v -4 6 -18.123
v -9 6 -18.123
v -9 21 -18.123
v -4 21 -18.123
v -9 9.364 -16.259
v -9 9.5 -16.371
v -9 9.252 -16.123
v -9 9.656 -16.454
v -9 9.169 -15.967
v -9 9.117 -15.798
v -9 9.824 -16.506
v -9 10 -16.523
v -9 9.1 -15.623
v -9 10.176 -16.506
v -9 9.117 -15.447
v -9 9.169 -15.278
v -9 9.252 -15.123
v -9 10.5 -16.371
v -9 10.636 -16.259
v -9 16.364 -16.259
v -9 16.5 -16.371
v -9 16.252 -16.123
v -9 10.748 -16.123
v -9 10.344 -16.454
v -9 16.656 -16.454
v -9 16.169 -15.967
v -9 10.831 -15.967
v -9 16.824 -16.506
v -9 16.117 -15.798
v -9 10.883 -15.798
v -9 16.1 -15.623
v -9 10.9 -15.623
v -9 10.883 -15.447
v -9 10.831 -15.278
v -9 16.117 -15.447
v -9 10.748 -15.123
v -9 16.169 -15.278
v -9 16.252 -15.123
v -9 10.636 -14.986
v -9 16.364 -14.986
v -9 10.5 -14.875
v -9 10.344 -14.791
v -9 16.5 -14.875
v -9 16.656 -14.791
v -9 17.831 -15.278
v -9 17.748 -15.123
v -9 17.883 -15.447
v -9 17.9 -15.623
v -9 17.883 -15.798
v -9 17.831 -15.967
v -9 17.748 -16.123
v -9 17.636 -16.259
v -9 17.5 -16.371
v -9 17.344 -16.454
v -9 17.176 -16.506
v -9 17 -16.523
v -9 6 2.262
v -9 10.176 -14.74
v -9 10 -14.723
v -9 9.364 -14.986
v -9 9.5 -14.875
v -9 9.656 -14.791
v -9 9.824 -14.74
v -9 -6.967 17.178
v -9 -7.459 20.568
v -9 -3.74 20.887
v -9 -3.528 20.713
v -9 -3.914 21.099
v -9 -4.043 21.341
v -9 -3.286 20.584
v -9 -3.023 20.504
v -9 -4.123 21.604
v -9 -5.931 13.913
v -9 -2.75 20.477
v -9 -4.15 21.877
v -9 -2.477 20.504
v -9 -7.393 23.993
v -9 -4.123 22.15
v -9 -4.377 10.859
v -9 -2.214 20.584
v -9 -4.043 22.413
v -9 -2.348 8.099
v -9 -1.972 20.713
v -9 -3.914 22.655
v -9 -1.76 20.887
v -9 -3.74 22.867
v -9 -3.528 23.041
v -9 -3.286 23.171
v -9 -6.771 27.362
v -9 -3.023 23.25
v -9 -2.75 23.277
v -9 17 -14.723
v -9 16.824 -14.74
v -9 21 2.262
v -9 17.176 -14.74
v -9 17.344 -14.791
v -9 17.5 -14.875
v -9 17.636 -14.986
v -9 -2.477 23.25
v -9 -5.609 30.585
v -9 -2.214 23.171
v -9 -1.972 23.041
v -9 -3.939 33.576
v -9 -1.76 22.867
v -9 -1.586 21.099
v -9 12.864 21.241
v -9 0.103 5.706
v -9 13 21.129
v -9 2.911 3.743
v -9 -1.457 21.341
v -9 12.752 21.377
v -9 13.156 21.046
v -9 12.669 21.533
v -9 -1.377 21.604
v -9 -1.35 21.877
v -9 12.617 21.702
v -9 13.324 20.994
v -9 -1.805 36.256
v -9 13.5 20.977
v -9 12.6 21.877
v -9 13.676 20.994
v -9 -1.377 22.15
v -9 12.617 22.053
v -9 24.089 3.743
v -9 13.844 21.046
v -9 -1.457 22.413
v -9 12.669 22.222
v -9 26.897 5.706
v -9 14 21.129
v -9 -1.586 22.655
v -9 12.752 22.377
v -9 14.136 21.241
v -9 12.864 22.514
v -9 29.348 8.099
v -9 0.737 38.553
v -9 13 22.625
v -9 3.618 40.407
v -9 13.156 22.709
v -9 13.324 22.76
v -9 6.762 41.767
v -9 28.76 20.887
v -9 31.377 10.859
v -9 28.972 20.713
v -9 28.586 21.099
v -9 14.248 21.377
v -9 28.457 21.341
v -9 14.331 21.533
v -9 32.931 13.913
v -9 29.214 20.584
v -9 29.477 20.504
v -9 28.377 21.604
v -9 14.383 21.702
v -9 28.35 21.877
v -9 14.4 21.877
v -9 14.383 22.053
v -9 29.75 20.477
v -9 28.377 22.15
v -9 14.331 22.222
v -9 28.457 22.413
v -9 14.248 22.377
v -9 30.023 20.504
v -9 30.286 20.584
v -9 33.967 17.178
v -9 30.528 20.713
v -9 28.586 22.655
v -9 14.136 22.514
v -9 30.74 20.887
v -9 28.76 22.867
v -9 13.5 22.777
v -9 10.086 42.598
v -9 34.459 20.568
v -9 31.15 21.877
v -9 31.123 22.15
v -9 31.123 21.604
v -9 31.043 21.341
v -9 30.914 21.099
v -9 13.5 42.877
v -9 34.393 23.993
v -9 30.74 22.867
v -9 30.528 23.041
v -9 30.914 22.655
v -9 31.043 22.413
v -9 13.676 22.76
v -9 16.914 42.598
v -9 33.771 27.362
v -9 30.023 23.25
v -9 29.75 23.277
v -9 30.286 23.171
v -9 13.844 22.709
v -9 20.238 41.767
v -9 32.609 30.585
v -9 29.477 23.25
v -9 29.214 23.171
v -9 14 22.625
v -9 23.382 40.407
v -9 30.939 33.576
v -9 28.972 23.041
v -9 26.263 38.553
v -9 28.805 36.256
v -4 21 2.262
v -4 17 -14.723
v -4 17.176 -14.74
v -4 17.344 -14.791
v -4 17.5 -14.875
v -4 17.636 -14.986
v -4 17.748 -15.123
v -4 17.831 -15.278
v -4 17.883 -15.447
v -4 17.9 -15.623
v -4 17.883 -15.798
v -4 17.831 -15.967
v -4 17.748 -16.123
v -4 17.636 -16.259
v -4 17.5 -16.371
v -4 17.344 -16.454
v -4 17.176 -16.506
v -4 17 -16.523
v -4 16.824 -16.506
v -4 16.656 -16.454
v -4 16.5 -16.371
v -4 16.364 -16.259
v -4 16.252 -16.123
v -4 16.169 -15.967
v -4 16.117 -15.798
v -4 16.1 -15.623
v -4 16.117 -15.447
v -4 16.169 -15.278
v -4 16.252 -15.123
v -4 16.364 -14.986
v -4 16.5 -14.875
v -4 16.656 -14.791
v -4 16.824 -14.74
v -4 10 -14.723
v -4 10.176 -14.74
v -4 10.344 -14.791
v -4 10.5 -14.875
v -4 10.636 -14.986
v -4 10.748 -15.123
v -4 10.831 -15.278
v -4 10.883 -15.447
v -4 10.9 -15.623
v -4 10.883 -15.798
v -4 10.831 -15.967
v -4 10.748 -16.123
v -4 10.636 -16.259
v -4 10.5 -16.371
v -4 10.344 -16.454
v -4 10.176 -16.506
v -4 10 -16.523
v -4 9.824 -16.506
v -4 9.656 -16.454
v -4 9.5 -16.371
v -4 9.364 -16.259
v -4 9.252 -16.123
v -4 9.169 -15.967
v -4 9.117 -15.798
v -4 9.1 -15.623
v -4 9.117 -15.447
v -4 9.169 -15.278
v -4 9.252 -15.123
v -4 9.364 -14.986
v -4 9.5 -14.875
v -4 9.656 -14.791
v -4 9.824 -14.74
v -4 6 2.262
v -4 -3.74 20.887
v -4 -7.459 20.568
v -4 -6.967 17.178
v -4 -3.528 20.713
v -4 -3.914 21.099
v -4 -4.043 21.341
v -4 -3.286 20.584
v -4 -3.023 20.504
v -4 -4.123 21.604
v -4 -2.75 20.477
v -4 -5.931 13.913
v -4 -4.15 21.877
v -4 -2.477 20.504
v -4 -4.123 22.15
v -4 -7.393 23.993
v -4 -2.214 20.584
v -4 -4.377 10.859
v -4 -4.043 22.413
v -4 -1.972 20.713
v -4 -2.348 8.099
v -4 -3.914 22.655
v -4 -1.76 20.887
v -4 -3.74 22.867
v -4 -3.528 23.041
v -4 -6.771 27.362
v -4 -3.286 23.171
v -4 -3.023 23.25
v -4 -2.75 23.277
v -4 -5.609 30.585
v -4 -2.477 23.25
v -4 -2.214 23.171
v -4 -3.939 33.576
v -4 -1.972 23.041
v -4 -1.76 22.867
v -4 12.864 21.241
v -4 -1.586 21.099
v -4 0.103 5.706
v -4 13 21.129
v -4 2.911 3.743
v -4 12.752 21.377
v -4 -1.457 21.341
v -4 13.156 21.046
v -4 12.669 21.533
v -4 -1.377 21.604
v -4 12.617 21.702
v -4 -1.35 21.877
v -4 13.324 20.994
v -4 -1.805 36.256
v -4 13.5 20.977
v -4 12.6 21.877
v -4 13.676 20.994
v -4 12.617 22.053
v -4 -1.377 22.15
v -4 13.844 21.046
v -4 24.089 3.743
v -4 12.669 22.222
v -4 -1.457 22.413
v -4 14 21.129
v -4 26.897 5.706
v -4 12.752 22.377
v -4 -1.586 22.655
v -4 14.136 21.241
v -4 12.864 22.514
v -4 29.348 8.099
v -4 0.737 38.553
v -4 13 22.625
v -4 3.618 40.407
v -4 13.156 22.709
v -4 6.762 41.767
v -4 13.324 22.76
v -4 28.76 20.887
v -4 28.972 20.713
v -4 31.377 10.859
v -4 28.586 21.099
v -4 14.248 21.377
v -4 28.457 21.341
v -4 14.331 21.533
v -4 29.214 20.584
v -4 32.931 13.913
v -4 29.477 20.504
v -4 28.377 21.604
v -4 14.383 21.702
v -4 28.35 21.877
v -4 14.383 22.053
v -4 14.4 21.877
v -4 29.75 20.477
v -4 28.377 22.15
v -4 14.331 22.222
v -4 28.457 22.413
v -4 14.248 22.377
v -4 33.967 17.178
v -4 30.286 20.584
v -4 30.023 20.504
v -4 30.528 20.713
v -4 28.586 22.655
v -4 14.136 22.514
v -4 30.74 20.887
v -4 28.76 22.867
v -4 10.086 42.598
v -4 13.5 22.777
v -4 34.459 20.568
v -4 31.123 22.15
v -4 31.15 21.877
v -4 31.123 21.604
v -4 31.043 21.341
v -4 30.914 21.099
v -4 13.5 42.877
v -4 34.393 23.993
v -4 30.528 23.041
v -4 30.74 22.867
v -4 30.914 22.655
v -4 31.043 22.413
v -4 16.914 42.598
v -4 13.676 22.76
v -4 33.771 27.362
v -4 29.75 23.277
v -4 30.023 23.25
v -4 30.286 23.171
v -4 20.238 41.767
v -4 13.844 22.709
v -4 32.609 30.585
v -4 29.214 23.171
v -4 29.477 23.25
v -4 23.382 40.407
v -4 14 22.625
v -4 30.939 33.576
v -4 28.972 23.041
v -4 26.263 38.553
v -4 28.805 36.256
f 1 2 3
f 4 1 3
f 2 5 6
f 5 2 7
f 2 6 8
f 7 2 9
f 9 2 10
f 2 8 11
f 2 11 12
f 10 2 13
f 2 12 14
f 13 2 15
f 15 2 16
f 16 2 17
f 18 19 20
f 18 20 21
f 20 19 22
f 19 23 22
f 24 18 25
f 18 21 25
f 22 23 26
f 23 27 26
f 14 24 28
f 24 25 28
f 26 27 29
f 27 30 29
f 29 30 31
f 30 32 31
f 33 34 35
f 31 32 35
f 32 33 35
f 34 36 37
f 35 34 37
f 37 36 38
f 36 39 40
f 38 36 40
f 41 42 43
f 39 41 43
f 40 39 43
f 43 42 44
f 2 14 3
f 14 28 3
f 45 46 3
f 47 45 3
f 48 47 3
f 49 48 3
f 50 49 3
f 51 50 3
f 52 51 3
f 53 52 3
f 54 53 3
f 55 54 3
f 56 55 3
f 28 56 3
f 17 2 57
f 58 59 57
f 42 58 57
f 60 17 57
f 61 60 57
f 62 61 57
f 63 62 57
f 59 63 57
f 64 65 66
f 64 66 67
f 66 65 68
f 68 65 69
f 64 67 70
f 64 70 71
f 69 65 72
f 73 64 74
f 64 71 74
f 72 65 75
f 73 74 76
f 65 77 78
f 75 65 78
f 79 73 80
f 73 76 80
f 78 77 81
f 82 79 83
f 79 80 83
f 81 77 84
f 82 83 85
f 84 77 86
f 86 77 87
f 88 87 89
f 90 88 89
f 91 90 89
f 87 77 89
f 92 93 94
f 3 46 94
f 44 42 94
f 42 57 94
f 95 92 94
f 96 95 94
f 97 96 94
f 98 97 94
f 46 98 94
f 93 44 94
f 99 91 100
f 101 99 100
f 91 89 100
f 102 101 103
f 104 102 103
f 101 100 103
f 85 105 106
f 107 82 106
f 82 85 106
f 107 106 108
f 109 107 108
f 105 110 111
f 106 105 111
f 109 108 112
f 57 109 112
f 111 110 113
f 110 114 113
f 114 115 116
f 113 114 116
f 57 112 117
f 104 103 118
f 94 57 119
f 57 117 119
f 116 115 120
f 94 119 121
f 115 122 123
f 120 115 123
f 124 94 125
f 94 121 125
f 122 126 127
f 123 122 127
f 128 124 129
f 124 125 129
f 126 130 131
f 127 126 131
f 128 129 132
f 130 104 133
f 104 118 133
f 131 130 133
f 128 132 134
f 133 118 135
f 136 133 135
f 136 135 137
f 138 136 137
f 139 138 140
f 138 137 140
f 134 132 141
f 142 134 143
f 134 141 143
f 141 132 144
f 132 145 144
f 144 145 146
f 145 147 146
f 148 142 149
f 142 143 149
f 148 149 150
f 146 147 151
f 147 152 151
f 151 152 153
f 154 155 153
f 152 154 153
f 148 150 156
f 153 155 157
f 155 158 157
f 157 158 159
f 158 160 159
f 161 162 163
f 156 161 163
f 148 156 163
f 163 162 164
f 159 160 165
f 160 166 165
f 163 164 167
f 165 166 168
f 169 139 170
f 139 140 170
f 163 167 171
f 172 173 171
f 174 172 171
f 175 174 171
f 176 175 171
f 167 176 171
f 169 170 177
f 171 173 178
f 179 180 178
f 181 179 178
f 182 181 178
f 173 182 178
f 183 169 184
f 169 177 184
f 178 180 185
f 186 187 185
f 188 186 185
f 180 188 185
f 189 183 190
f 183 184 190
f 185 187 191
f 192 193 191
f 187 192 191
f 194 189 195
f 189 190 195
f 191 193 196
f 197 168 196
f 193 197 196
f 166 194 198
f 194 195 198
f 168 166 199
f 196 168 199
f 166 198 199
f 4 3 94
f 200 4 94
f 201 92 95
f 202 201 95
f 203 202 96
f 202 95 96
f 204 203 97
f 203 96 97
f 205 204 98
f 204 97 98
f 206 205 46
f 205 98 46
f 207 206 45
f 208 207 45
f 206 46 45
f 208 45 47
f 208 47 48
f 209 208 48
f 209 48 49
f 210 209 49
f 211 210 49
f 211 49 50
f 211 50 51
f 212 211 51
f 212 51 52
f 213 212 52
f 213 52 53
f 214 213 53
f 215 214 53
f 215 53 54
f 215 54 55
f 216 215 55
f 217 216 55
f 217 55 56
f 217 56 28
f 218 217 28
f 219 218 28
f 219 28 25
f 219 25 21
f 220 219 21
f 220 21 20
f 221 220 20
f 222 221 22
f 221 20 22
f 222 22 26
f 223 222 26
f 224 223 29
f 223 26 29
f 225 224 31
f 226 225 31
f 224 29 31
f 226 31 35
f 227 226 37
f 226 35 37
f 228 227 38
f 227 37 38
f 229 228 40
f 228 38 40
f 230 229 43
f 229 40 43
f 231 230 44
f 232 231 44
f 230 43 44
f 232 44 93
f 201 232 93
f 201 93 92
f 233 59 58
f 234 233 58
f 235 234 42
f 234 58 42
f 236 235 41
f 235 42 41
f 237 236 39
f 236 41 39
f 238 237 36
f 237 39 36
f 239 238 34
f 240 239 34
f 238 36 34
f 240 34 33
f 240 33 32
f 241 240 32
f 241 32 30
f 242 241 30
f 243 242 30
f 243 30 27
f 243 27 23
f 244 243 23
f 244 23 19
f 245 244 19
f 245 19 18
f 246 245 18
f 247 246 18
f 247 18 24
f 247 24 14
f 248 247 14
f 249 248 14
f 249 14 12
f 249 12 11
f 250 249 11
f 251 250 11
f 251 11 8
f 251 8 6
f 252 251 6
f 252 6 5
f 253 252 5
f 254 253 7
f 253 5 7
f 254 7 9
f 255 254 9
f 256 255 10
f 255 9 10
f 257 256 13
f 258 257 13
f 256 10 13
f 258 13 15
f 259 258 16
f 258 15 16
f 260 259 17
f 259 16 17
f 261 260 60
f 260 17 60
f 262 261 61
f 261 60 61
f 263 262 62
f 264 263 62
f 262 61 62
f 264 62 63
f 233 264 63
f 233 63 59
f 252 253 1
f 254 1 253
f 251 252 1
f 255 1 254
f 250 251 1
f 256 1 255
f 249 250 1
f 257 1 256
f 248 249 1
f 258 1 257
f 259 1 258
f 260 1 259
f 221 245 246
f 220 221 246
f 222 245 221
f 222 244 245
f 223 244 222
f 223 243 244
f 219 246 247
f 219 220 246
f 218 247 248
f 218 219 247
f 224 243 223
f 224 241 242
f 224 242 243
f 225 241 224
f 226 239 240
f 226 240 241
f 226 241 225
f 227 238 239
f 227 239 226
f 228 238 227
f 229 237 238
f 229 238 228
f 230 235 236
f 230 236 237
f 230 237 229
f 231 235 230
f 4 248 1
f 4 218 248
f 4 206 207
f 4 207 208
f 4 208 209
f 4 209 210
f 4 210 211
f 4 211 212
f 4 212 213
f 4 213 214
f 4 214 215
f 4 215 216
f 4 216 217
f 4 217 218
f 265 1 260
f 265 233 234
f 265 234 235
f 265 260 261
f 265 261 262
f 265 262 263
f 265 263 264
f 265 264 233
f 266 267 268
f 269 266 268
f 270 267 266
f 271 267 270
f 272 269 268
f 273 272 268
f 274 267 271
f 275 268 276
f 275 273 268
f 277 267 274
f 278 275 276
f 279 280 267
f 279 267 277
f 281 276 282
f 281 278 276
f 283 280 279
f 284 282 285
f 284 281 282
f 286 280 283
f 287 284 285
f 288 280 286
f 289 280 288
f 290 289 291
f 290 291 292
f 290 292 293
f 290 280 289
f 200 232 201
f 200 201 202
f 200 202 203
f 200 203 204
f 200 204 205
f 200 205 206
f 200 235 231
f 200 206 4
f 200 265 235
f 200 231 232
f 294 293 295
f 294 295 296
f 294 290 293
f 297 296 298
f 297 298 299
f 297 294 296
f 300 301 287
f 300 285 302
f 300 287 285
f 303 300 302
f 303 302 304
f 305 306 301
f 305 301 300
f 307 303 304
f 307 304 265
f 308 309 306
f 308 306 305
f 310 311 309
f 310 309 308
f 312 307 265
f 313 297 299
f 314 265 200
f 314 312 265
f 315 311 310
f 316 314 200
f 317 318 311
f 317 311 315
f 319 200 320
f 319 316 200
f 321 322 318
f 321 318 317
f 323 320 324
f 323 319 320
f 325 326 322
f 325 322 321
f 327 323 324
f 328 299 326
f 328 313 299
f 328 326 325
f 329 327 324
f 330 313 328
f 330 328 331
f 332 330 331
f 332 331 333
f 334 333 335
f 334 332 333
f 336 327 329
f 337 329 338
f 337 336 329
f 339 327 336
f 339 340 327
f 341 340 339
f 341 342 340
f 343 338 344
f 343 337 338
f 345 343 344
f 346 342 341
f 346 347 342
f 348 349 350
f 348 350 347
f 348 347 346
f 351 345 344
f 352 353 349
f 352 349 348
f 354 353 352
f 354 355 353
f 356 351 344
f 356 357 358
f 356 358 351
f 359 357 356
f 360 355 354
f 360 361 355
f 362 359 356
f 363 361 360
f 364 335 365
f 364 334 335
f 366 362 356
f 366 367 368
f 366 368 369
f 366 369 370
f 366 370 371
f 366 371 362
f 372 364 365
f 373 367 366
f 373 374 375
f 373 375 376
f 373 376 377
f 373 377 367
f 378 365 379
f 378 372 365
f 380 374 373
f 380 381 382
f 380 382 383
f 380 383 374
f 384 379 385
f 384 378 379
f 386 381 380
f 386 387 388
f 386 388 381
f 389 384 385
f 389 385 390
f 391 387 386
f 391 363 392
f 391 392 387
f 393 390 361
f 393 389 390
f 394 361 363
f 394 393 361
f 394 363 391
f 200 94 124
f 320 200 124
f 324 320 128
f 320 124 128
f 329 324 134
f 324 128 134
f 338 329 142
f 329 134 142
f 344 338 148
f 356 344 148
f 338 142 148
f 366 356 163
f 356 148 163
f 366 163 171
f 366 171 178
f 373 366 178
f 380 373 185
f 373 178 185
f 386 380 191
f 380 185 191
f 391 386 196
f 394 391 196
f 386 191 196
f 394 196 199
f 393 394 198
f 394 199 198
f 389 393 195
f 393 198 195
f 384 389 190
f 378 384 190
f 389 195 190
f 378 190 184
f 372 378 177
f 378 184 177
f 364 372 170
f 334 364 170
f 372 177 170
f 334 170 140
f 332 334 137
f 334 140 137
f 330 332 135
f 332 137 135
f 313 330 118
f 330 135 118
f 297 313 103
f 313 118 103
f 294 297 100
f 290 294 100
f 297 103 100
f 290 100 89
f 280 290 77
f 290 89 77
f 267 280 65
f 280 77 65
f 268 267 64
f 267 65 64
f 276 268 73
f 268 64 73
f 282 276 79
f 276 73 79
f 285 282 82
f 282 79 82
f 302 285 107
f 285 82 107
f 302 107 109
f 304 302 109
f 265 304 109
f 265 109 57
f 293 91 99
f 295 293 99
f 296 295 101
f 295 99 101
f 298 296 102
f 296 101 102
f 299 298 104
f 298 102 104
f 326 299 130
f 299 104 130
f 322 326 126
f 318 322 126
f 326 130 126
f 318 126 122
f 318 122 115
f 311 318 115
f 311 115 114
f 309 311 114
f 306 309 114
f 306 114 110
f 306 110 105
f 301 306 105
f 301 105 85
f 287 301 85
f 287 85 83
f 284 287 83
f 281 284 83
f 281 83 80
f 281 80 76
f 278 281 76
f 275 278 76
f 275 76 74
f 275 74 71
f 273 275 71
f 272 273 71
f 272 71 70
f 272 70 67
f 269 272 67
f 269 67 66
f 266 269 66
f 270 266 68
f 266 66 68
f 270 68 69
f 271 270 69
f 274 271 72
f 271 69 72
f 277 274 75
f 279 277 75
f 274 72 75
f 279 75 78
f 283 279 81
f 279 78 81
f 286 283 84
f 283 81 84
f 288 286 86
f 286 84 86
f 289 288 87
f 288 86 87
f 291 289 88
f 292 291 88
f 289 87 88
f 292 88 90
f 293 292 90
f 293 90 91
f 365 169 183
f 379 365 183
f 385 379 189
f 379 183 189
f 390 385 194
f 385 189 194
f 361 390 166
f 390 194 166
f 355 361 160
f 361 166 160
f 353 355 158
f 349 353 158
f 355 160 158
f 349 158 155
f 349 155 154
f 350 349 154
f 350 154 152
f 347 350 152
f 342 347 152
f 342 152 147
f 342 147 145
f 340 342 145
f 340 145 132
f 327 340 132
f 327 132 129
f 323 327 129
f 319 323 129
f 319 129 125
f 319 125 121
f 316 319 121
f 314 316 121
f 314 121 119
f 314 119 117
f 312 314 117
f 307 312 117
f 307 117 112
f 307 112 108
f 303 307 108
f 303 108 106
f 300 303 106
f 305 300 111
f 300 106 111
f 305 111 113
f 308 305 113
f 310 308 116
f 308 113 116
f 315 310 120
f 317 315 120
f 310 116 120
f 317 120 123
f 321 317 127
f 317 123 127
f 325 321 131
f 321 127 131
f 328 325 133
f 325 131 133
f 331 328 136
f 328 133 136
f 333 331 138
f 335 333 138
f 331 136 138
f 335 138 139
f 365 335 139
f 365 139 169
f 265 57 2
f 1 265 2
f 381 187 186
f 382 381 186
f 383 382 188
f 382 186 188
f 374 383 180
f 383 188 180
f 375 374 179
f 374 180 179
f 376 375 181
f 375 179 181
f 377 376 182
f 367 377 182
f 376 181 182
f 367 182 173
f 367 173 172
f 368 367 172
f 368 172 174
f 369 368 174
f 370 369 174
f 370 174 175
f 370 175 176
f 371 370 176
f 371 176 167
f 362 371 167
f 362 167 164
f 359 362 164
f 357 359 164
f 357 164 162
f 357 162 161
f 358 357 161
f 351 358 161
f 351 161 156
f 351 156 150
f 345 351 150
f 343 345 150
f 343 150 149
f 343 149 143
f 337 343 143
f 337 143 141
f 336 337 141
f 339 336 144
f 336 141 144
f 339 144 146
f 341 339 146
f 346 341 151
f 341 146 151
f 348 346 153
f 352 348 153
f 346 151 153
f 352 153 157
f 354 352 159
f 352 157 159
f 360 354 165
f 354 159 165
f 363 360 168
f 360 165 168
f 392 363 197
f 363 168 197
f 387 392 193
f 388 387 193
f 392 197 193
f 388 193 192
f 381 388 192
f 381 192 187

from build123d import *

# Parameters (mm, degrees)
EXTRUDE_1_DEPTH     = 5
SKETCH_8_R          = 0.9
SKETCH_8_R_2        = 1.4
CUT_EXTRUDE_3_DEPTH = 10


with BuildPart() as part:
    # 스케치1 → 보스-돌출1 (new body)
    with BuildSketch(Plane(origin=(-9, 0, 0), x_dir=(0, -1, 0), z_dir=(-1, 0, 0))):
        with BuildLine():
            Line((-21, -18.122865071), (-21, 2.262089683))
            ThreePointArc((-21, 2.262089683), (-13.5, 42.877134929), (-6, 2.262089683))
            Line((-6, 2.262089683), (-6, -18.122865071))
            Line((-6, -18.122865071), (-21, -18.122865071))
        make_face()
    extrude(amount=-EXTRUDE_1_DEPTH)

    # 스케치8 → 컷-돌출3 (cut)
    with BuildSketch(Plane.ZY.offset(9)):
        with Locations((21.877134929, 13.5)):
            Circle(SKETCH_8_R)
        with Locations((-15.622865071, 17)):
            Circle(SKETCH_8_R)
        with Locations((-15.622865071, 10)):
            Circle(SKETCH_8_R)
        with Locations((21.877134929, 29.75)):
            Circle(SKETCH_8_R_2)
        with Locations((21.877134929, -2.75)):
            Circle(SKETCH_8_R_2)
    extrude(amount=-CUT_EXTRUDE_3_DEPTH, mode=Mode.SUBTRACT)


solid = part.part
